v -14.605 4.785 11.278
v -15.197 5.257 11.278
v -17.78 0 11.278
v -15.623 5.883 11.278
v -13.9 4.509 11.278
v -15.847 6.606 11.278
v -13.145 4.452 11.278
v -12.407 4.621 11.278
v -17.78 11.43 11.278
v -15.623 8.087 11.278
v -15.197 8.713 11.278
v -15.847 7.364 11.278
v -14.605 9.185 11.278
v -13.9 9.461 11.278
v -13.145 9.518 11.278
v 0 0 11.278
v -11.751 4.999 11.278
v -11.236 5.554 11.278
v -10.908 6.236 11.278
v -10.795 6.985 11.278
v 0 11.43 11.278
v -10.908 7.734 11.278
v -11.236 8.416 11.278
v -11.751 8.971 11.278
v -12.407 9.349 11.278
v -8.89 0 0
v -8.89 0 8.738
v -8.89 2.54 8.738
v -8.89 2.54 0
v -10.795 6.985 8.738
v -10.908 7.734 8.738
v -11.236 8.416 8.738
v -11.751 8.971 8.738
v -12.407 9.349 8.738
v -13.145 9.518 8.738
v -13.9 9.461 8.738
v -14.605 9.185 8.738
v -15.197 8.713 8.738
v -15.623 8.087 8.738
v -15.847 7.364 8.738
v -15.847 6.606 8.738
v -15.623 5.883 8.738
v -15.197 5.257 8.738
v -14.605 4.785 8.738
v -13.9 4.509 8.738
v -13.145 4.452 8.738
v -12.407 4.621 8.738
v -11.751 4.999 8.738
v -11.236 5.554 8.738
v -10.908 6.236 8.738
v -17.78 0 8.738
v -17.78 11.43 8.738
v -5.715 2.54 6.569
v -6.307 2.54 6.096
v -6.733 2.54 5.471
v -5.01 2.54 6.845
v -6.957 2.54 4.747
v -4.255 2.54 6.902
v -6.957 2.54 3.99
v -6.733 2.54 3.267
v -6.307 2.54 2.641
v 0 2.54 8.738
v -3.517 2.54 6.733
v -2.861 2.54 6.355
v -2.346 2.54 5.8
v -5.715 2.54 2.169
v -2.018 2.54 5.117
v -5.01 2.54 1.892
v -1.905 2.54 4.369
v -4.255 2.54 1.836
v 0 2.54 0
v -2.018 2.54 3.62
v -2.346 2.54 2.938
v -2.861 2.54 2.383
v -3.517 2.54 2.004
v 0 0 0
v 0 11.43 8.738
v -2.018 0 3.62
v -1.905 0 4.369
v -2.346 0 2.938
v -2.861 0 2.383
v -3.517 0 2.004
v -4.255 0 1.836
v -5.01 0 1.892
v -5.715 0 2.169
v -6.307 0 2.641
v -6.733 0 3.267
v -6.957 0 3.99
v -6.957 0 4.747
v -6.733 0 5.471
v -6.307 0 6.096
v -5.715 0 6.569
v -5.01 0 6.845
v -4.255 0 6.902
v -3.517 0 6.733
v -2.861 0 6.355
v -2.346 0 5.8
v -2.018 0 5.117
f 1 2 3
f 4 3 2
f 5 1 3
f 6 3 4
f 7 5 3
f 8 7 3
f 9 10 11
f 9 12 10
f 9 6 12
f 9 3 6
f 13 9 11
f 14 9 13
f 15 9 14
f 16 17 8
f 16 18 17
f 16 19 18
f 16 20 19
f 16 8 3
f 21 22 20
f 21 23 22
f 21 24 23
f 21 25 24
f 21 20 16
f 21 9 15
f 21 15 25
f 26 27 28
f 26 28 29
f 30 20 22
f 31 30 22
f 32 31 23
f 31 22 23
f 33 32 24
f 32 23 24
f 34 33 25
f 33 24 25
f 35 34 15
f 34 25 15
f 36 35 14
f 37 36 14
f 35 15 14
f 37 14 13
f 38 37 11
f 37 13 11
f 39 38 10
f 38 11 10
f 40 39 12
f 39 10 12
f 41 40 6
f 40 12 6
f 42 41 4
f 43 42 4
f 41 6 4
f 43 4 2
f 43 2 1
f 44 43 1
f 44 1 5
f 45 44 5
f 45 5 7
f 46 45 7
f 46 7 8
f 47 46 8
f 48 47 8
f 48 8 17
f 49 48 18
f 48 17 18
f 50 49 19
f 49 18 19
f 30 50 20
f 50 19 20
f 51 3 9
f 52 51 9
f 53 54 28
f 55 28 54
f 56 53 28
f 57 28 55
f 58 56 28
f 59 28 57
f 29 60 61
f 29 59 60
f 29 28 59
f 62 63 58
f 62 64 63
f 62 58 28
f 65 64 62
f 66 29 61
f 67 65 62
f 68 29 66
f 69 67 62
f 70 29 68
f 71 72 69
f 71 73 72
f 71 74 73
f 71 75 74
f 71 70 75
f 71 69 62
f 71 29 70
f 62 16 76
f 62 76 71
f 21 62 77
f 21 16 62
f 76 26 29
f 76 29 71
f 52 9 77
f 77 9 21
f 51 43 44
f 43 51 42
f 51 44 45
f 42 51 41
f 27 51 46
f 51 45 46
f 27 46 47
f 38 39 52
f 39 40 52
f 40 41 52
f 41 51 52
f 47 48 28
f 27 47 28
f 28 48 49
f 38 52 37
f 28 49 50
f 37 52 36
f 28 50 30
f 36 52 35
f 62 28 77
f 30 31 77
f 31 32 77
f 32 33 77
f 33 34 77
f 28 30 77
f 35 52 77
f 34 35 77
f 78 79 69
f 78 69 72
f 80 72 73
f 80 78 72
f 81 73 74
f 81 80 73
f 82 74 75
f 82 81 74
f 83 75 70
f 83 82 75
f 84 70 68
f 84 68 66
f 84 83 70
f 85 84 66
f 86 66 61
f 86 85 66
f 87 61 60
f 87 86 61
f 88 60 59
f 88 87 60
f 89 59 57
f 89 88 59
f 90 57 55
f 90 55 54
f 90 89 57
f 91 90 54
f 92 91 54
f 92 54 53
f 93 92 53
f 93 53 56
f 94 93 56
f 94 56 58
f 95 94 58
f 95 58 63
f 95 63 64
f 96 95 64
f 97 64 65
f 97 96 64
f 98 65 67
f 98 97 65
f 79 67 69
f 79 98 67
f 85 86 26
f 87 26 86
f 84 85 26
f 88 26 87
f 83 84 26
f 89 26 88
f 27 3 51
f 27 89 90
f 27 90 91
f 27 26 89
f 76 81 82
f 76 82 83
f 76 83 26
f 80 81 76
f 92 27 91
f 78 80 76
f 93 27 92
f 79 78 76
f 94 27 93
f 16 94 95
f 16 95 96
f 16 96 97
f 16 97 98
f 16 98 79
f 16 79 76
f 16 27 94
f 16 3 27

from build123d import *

# Parameters (mm, degrees)
SKETCH1_W           = 8.89
SKETCH1_H           = 11.2776
SKETCH1_R           = 2.54
BOSS_EXTRUDE1_DEPTH = 2.54
SKETCH4_W           = 17.78
SKETCH4_H           = 11.43
SKETCH4_R           = 2.54
BOSS_EXTRUDE2_DEPTH = 2.54


with BuildPart() as part:
    # Sketch1 → Boss-Extrude1 (new body)
    with BuildSketch(Plane(origin=(0, 0, 0), x_dir=(1, 0, 0), z_dir=(0, 1, 0))):
        with Locations((-4.445, -5.6388)):
            Rectangle(SKETCH1_W, SKETCH1_H)
        with Locations((-4.445, -4.3688)):
            Circle(SKETCH1_R, mode=Mode.SUBTRACT)
    extrude(amount=BOSS_EXTRUDE1_DEPTH)

    # Sketch4 → Boss-Extrude2 (add)
    with BuildSketch(Plane.XY.offset(11.2776)):
        with Locations((-8.89, 5.715)):
            Rectangle(SKETCH4_W, SKETCH4_H)
        with Locations((-13.335, 6.985)):
            Circle(SKETCH4_R, mode=Mode.SUBTRACT)
    extrude(amount=-BOSS_EXTRUDE2_DEPTH)


solid = part.part
